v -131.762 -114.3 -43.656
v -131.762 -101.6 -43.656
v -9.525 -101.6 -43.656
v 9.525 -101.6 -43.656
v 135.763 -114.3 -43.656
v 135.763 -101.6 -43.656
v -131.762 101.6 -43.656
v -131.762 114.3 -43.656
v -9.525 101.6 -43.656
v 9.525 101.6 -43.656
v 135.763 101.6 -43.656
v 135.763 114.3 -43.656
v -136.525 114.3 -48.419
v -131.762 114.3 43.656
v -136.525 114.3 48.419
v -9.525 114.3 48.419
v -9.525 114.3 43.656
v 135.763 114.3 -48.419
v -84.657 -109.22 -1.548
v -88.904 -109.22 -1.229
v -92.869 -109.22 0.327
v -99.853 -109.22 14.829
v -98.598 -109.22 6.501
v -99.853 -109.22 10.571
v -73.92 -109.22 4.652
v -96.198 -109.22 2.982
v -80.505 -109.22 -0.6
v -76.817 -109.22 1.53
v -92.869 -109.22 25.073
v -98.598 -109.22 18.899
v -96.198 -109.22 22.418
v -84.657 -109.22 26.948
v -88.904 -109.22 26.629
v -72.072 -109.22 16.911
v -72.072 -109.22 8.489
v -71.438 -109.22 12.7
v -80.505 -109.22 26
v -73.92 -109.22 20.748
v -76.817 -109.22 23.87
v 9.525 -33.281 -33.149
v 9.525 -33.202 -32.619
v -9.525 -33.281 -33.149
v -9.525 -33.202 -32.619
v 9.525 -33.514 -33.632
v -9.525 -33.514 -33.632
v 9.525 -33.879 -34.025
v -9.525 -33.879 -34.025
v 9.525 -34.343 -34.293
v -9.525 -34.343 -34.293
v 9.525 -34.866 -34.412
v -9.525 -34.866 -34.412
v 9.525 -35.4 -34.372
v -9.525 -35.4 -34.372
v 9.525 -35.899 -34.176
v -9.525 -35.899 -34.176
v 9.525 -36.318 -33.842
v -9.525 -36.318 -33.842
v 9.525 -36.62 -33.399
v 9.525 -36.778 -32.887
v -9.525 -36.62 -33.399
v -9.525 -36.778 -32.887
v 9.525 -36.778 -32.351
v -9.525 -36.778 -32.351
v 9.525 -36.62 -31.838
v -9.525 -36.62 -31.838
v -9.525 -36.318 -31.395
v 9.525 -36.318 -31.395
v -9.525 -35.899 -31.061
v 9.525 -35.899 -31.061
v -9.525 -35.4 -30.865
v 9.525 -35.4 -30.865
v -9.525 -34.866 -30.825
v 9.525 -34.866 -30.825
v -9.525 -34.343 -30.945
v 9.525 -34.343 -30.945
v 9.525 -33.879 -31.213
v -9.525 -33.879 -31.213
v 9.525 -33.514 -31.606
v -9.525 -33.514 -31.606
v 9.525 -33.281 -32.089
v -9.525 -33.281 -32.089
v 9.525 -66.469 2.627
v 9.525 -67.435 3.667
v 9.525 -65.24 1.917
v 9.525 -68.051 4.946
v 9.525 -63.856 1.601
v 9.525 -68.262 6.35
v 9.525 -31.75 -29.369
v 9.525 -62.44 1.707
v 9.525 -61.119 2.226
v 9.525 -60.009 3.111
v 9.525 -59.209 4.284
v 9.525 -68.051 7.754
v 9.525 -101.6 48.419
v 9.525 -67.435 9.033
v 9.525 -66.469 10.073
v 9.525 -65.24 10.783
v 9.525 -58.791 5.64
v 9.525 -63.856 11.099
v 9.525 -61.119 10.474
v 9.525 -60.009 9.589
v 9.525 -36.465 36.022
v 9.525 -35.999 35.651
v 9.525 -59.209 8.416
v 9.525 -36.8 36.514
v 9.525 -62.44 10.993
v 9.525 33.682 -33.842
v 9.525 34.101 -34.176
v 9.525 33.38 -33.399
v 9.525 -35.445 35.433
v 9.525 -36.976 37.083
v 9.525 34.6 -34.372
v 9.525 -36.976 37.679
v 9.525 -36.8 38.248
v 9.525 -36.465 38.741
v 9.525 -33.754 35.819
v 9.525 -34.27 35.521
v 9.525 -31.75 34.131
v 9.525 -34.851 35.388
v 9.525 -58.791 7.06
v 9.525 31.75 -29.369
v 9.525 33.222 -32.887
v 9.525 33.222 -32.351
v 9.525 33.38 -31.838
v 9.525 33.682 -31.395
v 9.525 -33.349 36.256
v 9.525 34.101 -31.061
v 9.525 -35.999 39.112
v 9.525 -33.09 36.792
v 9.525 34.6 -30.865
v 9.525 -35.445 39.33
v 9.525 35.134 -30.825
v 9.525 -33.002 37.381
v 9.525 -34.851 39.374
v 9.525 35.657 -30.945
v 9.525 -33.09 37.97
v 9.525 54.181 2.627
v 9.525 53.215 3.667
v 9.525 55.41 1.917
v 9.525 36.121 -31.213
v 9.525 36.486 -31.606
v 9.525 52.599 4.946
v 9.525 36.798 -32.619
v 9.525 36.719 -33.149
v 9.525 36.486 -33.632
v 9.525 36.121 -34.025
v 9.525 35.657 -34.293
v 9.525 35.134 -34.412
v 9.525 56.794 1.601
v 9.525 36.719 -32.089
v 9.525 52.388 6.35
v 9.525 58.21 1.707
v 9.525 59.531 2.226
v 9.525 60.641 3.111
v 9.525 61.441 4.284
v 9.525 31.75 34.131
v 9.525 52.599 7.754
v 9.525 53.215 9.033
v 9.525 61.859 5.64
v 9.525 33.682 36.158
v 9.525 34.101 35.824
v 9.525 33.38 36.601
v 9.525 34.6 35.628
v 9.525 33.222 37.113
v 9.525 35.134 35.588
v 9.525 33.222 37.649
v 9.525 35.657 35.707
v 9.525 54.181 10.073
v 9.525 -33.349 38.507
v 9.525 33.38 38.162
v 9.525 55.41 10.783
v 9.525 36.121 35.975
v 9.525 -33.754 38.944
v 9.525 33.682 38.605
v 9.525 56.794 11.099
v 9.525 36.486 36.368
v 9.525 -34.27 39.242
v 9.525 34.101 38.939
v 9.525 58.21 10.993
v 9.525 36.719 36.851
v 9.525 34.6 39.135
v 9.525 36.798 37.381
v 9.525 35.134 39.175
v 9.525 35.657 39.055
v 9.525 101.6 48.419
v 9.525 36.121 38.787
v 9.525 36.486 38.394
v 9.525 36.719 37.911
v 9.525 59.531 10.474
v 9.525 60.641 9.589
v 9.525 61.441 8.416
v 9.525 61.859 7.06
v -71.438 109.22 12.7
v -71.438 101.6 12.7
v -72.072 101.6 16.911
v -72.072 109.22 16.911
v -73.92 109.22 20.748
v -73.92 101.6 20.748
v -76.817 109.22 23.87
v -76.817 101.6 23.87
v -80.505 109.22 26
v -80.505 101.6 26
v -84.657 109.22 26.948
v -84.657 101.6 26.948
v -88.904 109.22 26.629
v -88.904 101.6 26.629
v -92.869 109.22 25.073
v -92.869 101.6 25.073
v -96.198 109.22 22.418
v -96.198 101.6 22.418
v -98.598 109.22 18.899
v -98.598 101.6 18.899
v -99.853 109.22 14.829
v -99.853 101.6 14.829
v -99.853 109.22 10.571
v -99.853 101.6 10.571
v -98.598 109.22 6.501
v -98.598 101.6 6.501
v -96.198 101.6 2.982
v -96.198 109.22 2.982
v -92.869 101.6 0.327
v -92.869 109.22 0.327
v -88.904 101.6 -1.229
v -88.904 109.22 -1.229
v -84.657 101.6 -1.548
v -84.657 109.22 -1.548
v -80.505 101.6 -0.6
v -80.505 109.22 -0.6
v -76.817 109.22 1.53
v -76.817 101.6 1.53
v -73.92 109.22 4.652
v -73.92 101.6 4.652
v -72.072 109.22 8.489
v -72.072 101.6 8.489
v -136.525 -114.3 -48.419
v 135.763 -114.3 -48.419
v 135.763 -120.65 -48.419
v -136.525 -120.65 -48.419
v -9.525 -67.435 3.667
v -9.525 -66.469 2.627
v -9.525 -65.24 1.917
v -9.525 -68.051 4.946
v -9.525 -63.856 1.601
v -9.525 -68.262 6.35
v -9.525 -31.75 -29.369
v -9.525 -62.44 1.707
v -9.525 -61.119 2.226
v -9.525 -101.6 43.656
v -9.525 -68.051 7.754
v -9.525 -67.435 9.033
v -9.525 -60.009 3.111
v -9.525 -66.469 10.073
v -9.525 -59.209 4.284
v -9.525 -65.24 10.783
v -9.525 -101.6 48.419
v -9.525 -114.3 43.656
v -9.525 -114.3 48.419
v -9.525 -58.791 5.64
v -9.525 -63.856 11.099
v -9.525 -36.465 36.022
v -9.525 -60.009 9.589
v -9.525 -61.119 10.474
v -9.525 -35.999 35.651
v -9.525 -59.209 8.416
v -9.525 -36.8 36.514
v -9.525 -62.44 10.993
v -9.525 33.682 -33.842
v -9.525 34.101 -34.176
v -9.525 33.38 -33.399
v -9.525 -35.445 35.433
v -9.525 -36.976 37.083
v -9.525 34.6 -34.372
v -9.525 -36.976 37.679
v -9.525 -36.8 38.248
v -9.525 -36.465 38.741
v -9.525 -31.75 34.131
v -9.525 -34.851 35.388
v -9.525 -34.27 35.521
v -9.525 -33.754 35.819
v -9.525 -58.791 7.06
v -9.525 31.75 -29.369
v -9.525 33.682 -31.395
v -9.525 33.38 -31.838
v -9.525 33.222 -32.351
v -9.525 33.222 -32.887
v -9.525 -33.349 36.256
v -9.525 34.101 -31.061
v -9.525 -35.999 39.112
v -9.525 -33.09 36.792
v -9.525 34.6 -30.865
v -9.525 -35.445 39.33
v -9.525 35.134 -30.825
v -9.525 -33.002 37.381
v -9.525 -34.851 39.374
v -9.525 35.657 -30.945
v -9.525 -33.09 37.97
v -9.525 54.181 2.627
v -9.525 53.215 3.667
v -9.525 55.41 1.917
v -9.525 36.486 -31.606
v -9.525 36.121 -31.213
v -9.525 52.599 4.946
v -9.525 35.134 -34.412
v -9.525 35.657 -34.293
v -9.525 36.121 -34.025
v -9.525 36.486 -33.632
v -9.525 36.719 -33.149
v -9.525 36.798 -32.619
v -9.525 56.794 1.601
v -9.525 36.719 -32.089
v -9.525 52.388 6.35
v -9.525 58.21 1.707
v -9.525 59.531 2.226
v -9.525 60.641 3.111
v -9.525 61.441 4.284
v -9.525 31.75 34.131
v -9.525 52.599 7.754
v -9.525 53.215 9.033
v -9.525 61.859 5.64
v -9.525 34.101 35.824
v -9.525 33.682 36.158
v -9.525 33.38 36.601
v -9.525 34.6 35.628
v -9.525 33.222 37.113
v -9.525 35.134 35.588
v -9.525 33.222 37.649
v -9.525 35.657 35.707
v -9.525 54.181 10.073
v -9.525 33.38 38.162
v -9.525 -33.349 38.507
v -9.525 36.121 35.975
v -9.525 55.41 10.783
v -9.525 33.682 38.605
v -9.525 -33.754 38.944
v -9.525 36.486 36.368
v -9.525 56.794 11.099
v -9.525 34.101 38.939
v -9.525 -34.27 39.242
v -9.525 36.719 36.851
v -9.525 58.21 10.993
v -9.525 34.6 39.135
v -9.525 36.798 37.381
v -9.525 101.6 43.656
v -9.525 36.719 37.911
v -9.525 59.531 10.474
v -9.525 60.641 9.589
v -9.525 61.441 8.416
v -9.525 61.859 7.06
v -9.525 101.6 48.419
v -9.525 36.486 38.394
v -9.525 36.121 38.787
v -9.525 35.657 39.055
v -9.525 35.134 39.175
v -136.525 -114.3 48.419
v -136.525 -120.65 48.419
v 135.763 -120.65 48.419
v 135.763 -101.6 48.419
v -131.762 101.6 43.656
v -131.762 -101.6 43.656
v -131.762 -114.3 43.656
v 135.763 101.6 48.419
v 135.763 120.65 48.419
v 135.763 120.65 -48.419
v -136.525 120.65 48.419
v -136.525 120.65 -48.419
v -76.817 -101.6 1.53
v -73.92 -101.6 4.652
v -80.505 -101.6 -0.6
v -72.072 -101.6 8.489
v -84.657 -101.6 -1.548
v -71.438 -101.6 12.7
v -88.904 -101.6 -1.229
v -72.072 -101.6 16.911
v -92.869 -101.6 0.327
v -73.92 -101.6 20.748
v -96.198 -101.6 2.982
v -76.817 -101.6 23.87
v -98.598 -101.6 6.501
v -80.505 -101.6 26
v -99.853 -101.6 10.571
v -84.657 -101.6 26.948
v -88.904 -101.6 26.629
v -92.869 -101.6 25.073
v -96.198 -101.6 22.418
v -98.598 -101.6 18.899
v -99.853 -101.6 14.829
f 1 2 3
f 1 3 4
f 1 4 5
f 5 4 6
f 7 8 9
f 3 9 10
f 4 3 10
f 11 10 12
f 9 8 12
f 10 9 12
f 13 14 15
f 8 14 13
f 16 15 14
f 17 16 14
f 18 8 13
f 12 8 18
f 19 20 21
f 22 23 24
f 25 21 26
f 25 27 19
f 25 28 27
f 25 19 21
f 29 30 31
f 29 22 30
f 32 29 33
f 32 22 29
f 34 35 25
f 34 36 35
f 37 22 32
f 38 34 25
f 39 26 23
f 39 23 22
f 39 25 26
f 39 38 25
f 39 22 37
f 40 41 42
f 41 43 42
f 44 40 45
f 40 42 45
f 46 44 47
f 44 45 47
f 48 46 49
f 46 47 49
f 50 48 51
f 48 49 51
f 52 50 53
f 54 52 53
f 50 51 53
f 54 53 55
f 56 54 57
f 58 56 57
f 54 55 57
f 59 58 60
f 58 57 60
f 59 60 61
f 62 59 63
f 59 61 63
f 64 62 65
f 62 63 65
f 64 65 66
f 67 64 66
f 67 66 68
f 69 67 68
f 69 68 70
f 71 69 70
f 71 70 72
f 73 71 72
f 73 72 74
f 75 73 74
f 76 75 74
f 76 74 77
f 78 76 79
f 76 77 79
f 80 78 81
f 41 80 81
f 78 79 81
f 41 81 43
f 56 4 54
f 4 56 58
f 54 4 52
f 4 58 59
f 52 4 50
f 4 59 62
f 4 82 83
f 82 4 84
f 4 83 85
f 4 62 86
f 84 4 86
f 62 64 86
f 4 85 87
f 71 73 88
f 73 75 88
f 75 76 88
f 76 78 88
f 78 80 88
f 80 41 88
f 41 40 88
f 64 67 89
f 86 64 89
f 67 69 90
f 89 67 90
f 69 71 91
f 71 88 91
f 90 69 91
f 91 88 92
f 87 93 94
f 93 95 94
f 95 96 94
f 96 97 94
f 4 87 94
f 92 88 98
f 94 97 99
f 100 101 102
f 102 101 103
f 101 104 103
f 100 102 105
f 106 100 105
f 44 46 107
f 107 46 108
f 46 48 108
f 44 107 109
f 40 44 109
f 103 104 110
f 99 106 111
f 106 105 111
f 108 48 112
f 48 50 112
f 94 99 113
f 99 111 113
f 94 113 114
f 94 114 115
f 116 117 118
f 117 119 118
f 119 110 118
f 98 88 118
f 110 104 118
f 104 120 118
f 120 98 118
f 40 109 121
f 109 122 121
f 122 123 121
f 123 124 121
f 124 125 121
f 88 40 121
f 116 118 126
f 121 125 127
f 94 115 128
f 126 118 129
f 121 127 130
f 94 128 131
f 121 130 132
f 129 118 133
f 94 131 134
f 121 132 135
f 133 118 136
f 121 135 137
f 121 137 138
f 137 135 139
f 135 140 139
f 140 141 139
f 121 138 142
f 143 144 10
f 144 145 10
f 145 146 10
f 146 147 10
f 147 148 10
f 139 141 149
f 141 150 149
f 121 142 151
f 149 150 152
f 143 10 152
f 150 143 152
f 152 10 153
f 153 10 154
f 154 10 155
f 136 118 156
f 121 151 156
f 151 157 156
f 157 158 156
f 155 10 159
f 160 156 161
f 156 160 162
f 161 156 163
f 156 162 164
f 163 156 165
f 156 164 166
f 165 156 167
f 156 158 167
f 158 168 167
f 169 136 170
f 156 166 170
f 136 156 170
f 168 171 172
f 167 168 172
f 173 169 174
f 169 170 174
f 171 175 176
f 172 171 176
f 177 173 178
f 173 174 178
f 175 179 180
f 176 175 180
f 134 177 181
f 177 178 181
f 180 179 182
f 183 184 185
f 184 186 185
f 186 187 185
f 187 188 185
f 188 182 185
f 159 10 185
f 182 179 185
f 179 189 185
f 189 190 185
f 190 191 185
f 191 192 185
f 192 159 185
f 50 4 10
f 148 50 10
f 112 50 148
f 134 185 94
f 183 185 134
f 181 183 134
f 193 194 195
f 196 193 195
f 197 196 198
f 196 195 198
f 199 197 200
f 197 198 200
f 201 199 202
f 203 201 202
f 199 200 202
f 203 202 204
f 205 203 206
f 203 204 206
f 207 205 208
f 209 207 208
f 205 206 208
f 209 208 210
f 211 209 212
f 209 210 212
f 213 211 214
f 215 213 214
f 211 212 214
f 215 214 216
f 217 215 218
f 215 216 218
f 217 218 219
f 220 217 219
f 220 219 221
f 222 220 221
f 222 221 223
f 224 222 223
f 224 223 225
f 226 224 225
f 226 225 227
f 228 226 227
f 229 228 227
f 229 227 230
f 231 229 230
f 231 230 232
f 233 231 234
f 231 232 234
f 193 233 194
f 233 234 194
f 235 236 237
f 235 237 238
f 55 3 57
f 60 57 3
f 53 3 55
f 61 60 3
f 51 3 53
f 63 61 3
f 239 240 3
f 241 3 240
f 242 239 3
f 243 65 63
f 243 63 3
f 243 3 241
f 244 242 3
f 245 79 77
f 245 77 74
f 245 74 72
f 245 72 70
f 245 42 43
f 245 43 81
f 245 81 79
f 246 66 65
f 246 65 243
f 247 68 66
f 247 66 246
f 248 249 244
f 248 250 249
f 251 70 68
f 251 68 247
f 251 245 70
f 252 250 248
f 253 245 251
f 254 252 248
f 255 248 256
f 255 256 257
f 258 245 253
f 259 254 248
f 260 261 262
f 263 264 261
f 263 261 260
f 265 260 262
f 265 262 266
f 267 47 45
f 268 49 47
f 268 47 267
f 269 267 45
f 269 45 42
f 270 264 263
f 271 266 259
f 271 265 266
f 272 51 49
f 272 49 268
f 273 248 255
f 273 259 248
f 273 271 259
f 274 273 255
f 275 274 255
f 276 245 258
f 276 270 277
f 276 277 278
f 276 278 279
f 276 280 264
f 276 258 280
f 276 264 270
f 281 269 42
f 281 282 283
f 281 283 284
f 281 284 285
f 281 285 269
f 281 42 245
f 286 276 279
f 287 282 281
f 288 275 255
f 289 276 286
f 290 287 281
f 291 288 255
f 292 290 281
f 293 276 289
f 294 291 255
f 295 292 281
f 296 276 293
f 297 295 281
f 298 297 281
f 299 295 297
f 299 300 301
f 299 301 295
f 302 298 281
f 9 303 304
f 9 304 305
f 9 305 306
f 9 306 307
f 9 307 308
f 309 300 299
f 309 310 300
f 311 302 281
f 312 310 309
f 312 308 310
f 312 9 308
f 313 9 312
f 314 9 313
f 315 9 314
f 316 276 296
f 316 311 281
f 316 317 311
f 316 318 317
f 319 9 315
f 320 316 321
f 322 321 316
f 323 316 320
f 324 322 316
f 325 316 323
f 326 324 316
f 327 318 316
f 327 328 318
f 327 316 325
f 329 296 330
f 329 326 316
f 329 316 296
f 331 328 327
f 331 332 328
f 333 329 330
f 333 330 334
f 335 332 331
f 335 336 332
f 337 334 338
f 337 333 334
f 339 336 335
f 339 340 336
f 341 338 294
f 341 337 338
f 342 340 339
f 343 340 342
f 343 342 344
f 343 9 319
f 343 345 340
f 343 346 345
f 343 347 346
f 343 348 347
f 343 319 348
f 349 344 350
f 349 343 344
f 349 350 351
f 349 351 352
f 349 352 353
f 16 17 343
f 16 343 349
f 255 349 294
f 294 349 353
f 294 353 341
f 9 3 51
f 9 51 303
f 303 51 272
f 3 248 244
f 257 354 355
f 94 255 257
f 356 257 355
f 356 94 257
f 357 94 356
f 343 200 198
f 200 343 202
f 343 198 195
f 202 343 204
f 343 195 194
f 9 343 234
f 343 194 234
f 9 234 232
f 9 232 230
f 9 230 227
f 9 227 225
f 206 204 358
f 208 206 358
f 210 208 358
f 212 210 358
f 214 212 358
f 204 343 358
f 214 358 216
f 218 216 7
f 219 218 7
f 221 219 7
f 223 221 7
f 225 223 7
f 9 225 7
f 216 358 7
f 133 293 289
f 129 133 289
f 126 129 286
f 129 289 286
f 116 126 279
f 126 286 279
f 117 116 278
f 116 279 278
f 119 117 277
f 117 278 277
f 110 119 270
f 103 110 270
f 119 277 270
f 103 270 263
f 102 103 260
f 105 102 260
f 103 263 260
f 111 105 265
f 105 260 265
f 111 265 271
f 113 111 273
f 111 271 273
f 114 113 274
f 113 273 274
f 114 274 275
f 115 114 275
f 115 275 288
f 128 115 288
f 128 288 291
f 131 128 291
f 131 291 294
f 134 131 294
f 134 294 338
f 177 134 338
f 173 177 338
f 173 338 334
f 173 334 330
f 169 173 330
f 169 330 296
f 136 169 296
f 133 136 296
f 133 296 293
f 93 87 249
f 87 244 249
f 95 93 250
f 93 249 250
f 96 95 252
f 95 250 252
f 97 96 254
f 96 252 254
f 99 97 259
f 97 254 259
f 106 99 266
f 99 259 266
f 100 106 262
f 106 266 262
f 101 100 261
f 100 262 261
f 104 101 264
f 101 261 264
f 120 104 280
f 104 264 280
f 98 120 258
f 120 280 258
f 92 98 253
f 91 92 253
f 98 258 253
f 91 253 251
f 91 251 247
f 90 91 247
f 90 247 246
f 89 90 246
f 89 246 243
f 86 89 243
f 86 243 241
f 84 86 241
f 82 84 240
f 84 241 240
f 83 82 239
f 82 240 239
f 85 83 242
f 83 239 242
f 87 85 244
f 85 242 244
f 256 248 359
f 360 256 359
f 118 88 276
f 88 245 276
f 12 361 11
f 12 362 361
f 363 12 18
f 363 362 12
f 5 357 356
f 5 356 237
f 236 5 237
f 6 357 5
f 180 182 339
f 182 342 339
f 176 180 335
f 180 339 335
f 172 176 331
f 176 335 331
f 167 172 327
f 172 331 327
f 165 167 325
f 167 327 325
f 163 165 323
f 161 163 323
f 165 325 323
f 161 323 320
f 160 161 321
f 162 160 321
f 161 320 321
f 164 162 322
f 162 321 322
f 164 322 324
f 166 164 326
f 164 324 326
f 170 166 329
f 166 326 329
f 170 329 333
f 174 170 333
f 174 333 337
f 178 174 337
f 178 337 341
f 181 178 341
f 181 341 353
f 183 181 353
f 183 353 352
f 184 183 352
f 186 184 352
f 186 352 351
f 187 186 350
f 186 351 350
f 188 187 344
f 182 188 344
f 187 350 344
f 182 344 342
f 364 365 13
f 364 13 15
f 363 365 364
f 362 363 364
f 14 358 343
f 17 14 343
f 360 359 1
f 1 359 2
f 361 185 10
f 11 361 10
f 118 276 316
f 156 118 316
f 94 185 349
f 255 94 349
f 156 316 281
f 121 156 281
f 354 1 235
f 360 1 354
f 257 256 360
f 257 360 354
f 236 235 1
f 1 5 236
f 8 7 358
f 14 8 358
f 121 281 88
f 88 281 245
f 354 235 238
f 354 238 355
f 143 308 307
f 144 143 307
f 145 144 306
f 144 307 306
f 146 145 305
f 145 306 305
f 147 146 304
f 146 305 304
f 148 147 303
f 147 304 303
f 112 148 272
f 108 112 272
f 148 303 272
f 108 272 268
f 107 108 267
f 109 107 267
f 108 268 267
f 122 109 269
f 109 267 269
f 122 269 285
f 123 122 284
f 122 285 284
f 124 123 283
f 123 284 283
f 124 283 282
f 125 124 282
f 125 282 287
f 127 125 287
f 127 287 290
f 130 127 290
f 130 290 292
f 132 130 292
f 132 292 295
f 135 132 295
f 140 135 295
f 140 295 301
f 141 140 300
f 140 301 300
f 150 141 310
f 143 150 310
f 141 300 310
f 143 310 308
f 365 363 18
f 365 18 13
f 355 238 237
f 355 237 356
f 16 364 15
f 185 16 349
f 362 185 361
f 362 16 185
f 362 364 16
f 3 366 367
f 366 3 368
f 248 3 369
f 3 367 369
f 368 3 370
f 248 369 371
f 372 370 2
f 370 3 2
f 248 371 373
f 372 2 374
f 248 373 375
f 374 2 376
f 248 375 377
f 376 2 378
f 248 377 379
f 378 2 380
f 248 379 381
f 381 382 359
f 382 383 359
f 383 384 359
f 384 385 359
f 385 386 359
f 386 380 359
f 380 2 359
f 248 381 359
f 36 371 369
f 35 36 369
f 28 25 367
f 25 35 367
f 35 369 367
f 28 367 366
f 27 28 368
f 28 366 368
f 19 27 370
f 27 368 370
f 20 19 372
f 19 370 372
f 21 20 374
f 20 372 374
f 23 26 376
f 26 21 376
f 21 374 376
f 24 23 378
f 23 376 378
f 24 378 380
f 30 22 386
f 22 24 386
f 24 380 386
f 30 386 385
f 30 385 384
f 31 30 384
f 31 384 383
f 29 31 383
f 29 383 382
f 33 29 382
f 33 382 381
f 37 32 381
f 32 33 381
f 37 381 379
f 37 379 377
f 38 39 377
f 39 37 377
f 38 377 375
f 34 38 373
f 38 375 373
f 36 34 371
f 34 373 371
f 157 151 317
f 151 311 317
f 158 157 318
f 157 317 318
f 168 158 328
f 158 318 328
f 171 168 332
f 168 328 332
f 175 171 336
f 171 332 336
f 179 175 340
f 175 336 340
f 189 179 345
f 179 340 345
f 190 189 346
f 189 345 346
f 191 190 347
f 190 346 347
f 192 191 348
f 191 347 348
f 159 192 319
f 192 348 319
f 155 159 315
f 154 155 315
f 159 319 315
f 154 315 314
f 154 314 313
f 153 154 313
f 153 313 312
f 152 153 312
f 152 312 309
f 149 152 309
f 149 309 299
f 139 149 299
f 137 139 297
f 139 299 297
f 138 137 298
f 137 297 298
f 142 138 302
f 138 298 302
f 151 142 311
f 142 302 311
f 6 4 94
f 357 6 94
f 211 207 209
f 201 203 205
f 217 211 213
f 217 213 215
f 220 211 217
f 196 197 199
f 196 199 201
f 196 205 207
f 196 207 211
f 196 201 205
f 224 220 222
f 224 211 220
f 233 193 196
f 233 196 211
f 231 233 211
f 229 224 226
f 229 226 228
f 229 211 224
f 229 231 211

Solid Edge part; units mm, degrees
sketch "Sketch1" plane through (0, 0, 0) normal (0, -1, 0) x (1, 0, 0)
  line L0 (-136.525, 48.4187) -> (135.763, 48.4187)
  line L1 (135.763, 48.4187) -> (135.763, -48.4187)
  line L2 (135.763, -48.4187) -> (-136.525, -48.4188)
  line L3 (-136.525, -48.4188) -> (-136.525, 48.4187)
  dimension "D1" = 50.8
  dimension "D2" = 96.8375
  dimension "D3" = 96.8375
extrude "Protrusion1" add sketch "Sketch1" along normal mid plane 241.3
sketch "Sketch2" plane through (0, 0, 0) normal (1, 0, 0) x (0, 1, 0)
  line L0 (101.6, -48.4187) -> (-101.6, -48.4188)
  line L1 (-101.6, -48.4188) -> (-101.6, 48.4187)
  line L2 (-101.6, 48.4187) -> (101.6, 48.4188)
  line L3 (101.6, 48.4188) -> (101.6, -48.4187)
  dimension "D1" = 19.05
  dimension "D2" = 19.05
extrude "Cutout1" cut sketch "Sketch2" along normal up to next and the other way up to next
sketch "Sketch3" plane through (6.4194, -101.6, 0) normal (0, 1, 0) x (-1, 0, 0)
  line L0 (138.1819, -43.6563) -> (15.9444, -43.6563)
  line L1 (15.9444, -48.4188) -> (15.9444, -43.6563)
  line L2 (15.9444, -48.4188) -> (142.9444, -48.4188)
  line L3 (142.9444, -48.4188) -> (142.9444, 48.4187)
  line L4 (142.9444, 48.4187) -> (15.9444, 48.4187)
  line L5 (15.9444, 43.6562) -> (15.9444, 48.4187)
  line L6 (15.9444, 43.6562) -> (138.1819, 43.6562)
  line L7 (138.1819, 43.6562) -> (138.1819, -43.6563)
  dimension "D1" = 4.7625
  dimension "D2" = 4.7625
  dimension "D3" = 4.7625
extrude "ExtrudedCutout_2" cut sketch "Sketch3" against normal blind 12.7
mirror "Mirror1" about plane through (0, 0, 0) normal (0, 1, 0) of "ExtrudedCutout_2"
sketch "Sketch4" plane through (21.4313, 101.6, 12.7) normal (0, -1, 0) x (1, 0, 0)
  circle A0 centre (-107.1563, 0) radius 14.2875
  dimension "D1" = 28.575
extrude "ExtrudedCutout_3" cut sketch "Sketch4" against normal blind 7.62
mirror "Mirror2" about plane through (0, 0, 0) normal (0, -1, 0) of "ExtrudedCutout_3"
sketch "Sketch5" plane through (6.4194, 0, 0) normal (0, -1, 0) x (1, 0, 0)
  line L0 (-15.9444, -43.6563) -> (3.1056, -43.6563)
  line L1 (3.1056, -43.6563) -> (3.1056, 48.4188)
  line L2 (3.1056, 48.4188) -> (-15.9444, 48.4188)
  line L3 (-15.9444, 48.4188) -> (-15.9444, -43.6563)
  dimension "D1" = 19.05
  dimension "D2" = 4.7625
extrude "Protrusion2" add sketch "Sketch5" along normal up to next and the other way up to next
sketch "Sketch6" plane through (0, 0, 0) normal (1, 0, 0) x (0, 1, 0)
  line L0 (31.75, -29.3687) -> (-31.75, -29.3688)
  line L1 (-31.75, -29.3688) -> (-31.75, 34.1312)
  line L2 (-31.75, 34.1313) -> (31.75, 34.1313)
  line L3 (31.75, 34.1313) -> (31.75, -29.3687)
  circle A0 centre (-35, 37.3813) radius 1.9984
  circle A1 centre (-35, -32.6187) radius 1.7985
  circle A2 centre (35, 37.3813) radius 1.7985
  circle A3 centre (35, -32.6187) radius 1.7985
  dimension "D1" = 63.5
  dimension "D2" = 63.5
  dimension "D3" = 19.05
  dimension "D4" = 70
  dimension "D5" = 70
  dimension "D6" = 80
  dimension "D7" = 80
extrude "Cutout2" cut sketch "Sketch6" along normal up to next and the other way up to next
sketch "Sketch7" plane through (-9.525, 0, 3.175) normal (-1, 0, 0) x (0, -1, 0)
  circle A0 centre (-57.15, 3.175) radius 4.7625
  circle A1 centre (63.5, 3.175) radius 4.7625
  dimension "D1" = 6.35
  dimension "D2" = 57.15
  dimension "D3" = 63.5
  dimension "D4" = 9.525
extrude "Cutout3" cut sketch "Sketch7" against normal up to next
sketch "Sketch8" plane through (-136.525, 117.475, 0) normal (-1, 0, 0) x (0, 0, 1)
  line L0 (-43.6563, -3.175) -> (-48.4188, -3.175)
  line L1 (-48.4188, -3.175) -> (-48.4188, -15.875)
  line L2 (-48.4188, -15.875) -> (-43.6563, -15.875)
  line L3 (-43.6563, -15.875) -> (-43.6563, -3.175)
  dimension "D1" = 4.7625
  dimension "D2" = 19.05
extrude "Cutout4" cut sketch "Sketch8" against normal up to next
mirror "Mirror3" about plane through (0, 0, 0) normal (0, -1, 0) of "Cutout4"
